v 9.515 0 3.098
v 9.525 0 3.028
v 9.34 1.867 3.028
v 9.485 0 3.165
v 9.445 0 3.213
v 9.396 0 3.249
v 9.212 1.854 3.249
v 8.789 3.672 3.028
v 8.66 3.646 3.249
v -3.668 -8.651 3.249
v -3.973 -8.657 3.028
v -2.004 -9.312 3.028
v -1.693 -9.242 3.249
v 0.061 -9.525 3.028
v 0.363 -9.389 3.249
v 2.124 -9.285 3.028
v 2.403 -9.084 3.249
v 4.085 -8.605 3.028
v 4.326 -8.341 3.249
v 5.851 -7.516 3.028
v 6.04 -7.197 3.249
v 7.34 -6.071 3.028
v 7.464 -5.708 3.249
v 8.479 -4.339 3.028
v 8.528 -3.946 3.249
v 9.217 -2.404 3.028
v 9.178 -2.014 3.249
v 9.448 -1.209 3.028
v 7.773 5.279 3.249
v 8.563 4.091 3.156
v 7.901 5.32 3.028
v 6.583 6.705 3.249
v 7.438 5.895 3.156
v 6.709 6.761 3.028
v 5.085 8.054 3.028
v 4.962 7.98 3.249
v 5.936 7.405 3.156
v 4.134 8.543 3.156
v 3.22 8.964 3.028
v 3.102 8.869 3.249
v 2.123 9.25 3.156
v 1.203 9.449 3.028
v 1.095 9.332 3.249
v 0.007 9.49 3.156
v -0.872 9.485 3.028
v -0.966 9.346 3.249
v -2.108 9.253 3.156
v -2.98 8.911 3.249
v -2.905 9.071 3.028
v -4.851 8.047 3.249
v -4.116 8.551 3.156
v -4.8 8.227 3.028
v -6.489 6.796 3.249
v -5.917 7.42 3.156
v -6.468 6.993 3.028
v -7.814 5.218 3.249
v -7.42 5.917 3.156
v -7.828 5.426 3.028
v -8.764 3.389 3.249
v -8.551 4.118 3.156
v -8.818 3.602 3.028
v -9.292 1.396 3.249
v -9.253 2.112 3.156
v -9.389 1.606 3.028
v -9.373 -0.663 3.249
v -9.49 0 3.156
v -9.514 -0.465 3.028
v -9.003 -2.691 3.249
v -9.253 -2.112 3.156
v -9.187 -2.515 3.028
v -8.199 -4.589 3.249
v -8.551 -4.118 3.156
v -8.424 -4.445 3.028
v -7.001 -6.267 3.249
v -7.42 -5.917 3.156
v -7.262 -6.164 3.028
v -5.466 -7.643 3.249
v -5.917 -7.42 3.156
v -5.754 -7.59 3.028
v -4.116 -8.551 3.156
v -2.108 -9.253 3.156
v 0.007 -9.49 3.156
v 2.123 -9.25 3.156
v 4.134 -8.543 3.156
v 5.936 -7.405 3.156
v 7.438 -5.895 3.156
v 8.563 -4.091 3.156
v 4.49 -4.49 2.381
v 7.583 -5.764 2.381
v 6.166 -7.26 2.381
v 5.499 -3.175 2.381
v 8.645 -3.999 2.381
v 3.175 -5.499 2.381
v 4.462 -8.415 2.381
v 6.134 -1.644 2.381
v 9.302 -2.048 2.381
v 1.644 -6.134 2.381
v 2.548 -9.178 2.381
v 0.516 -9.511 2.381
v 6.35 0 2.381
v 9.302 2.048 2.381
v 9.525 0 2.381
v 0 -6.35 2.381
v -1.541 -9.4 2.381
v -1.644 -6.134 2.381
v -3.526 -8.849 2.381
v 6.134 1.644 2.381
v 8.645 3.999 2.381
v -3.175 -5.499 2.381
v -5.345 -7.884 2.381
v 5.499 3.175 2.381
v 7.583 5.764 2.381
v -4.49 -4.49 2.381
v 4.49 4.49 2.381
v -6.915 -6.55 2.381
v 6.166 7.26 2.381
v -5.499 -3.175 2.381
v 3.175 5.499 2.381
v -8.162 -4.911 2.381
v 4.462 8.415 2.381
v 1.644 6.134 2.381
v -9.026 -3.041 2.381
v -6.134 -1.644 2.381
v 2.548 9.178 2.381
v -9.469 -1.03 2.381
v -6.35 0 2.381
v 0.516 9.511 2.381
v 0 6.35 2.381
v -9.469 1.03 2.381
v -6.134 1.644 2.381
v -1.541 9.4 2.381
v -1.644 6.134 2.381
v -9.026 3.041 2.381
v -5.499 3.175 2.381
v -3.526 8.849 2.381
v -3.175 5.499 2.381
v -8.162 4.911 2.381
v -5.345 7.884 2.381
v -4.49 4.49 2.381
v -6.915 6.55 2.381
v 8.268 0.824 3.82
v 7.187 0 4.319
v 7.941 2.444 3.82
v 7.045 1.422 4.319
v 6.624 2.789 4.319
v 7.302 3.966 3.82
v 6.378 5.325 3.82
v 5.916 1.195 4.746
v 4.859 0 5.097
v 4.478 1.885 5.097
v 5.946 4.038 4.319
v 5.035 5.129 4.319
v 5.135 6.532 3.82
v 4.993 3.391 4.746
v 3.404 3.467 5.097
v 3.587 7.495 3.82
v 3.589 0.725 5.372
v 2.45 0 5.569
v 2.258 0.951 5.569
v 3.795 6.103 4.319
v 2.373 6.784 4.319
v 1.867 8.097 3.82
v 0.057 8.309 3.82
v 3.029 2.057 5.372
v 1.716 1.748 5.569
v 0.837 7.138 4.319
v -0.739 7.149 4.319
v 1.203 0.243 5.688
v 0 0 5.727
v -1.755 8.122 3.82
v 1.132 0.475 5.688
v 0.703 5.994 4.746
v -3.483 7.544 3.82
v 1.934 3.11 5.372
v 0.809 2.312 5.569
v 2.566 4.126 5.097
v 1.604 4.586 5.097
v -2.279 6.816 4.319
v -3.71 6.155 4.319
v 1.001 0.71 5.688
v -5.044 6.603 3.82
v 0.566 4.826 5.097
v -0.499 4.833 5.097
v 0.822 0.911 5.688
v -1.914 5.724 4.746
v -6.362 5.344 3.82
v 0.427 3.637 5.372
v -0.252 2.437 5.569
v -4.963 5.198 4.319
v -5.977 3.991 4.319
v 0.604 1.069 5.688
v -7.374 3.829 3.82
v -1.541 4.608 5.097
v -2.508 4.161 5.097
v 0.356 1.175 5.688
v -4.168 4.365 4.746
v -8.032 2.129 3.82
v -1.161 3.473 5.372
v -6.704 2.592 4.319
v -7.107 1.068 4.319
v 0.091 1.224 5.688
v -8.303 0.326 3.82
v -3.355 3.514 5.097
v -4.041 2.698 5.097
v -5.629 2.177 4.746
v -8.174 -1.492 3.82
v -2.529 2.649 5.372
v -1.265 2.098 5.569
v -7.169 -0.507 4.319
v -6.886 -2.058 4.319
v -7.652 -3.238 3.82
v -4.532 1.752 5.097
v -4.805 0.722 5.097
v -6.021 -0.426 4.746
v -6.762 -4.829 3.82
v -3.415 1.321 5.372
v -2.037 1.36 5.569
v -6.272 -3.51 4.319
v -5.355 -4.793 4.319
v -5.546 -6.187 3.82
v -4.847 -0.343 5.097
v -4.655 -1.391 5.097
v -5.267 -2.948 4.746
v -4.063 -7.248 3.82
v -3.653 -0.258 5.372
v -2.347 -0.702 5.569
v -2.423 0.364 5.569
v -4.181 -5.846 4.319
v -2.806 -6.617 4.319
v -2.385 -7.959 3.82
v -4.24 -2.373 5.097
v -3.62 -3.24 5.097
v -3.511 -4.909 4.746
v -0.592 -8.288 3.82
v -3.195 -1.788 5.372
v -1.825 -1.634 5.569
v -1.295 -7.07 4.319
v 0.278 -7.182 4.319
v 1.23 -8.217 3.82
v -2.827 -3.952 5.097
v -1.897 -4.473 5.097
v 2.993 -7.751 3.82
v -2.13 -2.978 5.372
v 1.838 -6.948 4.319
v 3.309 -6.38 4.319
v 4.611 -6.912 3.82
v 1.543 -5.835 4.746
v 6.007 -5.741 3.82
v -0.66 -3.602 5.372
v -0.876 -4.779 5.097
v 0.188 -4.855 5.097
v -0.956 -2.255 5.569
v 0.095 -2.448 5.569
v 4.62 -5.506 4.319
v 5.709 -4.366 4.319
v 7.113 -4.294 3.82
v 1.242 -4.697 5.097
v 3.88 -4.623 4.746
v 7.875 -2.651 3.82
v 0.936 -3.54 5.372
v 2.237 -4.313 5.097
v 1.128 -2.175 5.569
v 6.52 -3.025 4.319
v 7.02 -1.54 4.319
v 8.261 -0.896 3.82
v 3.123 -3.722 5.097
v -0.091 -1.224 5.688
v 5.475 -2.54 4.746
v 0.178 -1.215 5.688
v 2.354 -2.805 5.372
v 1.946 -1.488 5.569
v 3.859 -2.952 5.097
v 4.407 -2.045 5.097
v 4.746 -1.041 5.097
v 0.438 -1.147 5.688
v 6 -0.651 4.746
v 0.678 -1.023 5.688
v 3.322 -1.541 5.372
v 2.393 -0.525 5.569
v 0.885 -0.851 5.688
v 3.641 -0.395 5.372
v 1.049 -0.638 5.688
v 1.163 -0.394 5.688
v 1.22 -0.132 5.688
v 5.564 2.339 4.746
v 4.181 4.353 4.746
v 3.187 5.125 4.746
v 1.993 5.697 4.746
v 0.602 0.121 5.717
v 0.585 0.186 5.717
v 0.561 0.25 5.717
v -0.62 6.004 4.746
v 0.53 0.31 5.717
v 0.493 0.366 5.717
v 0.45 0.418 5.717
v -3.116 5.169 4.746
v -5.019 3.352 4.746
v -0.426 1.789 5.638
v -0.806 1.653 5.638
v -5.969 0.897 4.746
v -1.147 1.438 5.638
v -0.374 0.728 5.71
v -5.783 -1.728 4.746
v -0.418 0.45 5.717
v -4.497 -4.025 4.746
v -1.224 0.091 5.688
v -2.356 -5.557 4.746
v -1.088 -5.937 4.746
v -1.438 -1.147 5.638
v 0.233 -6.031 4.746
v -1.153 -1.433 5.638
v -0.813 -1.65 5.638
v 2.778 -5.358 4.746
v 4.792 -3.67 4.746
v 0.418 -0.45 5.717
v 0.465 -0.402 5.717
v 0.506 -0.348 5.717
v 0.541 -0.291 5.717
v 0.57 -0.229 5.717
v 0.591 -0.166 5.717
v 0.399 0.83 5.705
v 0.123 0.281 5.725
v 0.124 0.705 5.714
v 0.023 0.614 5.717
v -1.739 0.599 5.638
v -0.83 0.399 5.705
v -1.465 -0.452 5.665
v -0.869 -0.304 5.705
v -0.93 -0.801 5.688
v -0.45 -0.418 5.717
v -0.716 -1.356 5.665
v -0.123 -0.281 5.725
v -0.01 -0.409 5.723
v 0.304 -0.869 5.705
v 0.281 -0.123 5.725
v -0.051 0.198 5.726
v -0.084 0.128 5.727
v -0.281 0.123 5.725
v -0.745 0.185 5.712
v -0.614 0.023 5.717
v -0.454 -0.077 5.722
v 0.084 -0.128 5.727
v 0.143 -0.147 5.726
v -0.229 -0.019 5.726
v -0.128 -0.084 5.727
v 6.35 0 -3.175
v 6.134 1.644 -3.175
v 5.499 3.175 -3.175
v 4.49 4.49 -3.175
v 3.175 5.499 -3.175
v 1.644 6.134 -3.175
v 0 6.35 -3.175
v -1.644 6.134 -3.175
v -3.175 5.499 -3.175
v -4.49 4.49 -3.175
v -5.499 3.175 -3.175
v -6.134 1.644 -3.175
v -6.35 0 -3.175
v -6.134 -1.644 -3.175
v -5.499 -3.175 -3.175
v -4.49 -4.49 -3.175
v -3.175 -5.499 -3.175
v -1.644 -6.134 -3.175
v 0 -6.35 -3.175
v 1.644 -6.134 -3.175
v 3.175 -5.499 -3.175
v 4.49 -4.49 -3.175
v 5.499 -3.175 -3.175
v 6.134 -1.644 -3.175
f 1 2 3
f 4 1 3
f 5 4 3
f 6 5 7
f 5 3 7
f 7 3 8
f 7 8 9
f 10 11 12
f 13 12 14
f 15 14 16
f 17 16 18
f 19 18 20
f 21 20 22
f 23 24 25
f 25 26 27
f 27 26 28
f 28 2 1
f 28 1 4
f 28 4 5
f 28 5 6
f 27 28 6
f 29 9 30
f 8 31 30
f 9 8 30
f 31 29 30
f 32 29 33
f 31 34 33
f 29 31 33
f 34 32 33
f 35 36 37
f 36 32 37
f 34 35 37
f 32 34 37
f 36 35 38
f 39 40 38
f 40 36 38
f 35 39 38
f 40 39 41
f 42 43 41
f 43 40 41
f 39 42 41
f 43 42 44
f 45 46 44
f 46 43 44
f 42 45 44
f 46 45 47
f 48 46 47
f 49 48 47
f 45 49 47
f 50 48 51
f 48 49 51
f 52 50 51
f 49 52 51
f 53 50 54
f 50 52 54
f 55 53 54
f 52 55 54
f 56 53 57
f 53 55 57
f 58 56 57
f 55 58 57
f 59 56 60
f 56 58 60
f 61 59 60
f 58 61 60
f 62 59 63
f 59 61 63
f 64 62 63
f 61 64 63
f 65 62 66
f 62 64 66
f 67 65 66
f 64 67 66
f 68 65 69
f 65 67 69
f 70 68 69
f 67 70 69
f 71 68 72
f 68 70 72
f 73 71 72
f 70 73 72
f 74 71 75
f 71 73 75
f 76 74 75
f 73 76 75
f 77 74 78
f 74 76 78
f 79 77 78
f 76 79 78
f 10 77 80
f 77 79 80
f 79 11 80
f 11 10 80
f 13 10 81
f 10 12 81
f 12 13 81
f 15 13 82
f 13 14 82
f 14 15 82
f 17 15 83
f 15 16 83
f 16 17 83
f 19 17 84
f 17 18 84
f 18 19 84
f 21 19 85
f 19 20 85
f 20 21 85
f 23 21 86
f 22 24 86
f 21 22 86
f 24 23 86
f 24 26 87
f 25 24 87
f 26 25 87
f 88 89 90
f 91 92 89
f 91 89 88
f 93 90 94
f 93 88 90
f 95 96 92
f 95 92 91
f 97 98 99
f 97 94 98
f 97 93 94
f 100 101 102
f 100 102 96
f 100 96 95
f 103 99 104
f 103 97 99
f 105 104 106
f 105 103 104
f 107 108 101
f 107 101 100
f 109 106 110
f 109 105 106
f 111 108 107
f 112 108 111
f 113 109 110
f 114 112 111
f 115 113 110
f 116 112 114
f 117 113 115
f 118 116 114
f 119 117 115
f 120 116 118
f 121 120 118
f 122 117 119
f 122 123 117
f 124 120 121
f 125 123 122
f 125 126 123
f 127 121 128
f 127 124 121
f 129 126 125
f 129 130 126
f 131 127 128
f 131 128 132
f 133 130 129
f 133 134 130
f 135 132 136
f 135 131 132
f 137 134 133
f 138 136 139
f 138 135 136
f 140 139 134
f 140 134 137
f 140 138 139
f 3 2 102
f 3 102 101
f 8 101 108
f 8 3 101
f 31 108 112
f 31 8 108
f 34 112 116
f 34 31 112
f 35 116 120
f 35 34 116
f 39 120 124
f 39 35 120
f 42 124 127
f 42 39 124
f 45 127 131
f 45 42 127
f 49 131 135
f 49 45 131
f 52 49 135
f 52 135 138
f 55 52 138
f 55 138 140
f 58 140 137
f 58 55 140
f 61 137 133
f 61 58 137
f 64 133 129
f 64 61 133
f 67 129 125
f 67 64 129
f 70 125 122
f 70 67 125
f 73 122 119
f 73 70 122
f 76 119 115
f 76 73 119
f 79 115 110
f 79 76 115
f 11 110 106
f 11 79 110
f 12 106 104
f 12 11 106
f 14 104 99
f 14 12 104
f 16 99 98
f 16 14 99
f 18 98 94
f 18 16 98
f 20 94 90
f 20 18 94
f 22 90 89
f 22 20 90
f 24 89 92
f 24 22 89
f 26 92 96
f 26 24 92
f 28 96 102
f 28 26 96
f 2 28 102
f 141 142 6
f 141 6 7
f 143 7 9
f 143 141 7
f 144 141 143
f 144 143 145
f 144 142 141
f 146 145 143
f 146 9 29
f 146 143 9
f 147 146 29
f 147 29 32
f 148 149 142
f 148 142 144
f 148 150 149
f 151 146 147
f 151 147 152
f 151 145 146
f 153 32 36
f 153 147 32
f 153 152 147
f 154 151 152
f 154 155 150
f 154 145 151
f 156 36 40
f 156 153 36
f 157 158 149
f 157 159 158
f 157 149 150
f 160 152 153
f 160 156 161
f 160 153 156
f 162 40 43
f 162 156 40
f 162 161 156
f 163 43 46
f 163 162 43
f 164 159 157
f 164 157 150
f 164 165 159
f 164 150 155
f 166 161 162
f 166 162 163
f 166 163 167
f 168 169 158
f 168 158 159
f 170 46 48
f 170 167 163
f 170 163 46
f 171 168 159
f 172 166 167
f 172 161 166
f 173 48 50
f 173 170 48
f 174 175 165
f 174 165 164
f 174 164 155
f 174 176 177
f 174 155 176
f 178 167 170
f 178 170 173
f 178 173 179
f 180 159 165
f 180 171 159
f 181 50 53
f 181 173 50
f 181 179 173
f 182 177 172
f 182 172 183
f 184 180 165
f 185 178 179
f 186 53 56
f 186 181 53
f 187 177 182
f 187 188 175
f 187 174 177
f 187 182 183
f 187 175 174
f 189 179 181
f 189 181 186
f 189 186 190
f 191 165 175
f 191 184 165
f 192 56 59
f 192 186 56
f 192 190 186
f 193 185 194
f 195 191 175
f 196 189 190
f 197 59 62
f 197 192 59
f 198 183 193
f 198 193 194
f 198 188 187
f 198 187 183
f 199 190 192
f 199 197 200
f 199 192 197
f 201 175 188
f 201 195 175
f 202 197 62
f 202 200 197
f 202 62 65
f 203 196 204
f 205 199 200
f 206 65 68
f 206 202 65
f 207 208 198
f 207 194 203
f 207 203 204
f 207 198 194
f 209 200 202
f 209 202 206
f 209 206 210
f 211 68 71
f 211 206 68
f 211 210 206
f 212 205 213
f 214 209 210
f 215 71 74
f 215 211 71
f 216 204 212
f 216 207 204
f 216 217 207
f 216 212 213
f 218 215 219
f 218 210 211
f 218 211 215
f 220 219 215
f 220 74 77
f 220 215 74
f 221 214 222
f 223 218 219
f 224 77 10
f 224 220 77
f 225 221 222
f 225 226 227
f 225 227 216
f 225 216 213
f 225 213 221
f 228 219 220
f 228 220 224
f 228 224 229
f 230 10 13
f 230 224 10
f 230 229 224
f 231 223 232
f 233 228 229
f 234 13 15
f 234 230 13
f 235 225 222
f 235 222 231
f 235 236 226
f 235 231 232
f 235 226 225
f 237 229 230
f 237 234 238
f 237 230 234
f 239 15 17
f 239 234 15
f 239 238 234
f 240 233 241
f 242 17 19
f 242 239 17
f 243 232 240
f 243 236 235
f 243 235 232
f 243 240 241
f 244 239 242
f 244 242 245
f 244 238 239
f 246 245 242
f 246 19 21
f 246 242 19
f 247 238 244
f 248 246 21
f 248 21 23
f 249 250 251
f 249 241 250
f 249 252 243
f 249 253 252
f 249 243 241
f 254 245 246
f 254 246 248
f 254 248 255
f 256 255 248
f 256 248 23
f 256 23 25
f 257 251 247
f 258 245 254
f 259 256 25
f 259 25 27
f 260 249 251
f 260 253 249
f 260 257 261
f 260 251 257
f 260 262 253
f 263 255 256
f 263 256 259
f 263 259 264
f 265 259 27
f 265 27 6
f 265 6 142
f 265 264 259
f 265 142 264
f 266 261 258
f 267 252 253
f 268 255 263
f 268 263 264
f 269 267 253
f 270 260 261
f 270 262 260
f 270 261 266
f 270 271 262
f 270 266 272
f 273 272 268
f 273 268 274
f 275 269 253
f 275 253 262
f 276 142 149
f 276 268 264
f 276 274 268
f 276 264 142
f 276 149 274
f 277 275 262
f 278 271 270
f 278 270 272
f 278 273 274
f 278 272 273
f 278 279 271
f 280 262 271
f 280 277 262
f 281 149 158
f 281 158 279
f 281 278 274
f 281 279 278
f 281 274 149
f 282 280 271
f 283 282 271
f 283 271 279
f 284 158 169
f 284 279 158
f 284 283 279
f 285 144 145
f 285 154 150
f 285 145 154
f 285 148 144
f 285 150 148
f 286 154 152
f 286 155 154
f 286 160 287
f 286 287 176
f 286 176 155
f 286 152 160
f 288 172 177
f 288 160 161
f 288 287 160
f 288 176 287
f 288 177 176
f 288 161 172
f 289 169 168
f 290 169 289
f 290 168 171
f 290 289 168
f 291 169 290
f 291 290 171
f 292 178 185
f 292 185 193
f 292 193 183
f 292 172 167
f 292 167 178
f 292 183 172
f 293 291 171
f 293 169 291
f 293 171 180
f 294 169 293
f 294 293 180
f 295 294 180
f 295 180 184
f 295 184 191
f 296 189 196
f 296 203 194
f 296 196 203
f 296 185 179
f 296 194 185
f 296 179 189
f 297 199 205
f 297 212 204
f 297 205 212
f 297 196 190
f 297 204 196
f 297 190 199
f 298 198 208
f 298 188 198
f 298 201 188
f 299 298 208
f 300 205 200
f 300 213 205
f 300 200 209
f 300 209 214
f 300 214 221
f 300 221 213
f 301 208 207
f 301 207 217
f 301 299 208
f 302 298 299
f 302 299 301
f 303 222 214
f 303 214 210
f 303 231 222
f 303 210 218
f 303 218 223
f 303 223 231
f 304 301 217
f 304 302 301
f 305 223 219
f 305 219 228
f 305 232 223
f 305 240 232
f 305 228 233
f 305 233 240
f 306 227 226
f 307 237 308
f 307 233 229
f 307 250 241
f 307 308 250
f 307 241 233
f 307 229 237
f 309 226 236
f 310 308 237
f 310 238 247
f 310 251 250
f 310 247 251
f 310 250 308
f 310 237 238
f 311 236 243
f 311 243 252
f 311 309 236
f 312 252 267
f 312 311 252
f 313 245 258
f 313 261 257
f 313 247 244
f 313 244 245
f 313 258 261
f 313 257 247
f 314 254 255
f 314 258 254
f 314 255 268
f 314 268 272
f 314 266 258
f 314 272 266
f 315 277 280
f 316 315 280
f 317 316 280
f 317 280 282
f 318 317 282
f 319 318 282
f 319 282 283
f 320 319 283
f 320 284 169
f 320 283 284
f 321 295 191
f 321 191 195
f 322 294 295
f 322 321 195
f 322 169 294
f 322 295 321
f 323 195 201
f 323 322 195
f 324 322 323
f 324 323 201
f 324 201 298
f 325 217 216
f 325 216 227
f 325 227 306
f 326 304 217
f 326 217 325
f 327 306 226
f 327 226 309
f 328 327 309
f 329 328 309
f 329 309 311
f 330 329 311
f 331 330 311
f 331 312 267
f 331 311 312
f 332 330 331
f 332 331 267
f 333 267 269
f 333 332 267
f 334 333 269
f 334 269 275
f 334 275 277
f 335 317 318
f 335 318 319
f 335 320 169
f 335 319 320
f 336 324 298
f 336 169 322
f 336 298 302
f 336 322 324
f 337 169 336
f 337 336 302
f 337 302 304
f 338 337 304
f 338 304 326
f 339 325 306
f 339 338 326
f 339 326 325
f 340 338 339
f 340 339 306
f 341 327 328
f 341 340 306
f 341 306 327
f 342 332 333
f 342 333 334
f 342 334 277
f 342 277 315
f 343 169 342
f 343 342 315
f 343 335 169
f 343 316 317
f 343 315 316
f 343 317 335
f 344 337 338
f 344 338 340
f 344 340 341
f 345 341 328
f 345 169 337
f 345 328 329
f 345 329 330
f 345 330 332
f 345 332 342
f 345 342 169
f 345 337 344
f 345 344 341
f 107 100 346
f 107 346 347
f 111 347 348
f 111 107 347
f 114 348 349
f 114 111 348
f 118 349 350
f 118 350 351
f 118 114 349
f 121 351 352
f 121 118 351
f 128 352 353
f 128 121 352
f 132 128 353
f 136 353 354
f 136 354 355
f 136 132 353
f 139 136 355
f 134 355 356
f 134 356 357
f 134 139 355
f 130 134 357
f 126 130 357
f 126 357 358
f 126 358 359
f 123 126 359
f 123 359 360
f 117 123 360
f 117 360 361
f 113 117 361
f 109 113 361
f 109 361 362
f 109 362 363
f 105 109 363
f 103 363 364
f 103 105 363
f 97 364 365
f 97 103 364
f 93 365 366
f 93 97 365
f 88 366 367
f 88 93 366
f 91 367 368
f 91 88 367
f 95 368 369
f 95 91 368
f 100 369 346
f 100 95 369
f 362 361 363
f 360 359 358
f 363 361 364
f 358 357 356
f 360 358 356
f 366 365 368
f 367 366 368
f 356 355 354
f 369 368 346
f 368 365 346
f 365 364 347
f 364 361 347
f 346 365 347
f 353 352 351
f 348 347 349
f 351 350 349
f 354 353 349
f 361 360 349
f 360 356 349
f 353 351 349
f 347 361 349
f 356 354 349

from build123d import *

# Parameters (mm, degrees)
F0_R     = 6.35
F1_DEPTH = 3.175
F4_R     = 0.254


with BuildPart() as f1:
    # F0 (on Top) → F1 (new body, symmetric)
    with BuildSketch(Plane.XY):
        Circle(F0_R)
    extrude(amount=F1_DEPTH, both=True)

    # F2 (on Front) → F3 (revolve)
    with BuildSketch(Plane.XZ):
        with BuildLine():
            Line((9.525, 2.38125), (9.525, 3.175))
            ThreePointArc((9.525, 3.175), (4.930503, 5.078103), (0, 5.727216))
            Line((0, 5.727216), (0, 2.38125))
            Line((0, 2.38125), (9.525, 2.38125))
        make_face()
    revolve(axis=Axis((0, 0, 4.054233), (0, 0, 1)))

    # F4
    f4_edges = [f1.edges().sort_by_distance(p)[0] for p in [
        (-9.525, 0, 3.175),
    ]]
    fillet(f4_edges, radius=F4_R)


solid = f1.part
